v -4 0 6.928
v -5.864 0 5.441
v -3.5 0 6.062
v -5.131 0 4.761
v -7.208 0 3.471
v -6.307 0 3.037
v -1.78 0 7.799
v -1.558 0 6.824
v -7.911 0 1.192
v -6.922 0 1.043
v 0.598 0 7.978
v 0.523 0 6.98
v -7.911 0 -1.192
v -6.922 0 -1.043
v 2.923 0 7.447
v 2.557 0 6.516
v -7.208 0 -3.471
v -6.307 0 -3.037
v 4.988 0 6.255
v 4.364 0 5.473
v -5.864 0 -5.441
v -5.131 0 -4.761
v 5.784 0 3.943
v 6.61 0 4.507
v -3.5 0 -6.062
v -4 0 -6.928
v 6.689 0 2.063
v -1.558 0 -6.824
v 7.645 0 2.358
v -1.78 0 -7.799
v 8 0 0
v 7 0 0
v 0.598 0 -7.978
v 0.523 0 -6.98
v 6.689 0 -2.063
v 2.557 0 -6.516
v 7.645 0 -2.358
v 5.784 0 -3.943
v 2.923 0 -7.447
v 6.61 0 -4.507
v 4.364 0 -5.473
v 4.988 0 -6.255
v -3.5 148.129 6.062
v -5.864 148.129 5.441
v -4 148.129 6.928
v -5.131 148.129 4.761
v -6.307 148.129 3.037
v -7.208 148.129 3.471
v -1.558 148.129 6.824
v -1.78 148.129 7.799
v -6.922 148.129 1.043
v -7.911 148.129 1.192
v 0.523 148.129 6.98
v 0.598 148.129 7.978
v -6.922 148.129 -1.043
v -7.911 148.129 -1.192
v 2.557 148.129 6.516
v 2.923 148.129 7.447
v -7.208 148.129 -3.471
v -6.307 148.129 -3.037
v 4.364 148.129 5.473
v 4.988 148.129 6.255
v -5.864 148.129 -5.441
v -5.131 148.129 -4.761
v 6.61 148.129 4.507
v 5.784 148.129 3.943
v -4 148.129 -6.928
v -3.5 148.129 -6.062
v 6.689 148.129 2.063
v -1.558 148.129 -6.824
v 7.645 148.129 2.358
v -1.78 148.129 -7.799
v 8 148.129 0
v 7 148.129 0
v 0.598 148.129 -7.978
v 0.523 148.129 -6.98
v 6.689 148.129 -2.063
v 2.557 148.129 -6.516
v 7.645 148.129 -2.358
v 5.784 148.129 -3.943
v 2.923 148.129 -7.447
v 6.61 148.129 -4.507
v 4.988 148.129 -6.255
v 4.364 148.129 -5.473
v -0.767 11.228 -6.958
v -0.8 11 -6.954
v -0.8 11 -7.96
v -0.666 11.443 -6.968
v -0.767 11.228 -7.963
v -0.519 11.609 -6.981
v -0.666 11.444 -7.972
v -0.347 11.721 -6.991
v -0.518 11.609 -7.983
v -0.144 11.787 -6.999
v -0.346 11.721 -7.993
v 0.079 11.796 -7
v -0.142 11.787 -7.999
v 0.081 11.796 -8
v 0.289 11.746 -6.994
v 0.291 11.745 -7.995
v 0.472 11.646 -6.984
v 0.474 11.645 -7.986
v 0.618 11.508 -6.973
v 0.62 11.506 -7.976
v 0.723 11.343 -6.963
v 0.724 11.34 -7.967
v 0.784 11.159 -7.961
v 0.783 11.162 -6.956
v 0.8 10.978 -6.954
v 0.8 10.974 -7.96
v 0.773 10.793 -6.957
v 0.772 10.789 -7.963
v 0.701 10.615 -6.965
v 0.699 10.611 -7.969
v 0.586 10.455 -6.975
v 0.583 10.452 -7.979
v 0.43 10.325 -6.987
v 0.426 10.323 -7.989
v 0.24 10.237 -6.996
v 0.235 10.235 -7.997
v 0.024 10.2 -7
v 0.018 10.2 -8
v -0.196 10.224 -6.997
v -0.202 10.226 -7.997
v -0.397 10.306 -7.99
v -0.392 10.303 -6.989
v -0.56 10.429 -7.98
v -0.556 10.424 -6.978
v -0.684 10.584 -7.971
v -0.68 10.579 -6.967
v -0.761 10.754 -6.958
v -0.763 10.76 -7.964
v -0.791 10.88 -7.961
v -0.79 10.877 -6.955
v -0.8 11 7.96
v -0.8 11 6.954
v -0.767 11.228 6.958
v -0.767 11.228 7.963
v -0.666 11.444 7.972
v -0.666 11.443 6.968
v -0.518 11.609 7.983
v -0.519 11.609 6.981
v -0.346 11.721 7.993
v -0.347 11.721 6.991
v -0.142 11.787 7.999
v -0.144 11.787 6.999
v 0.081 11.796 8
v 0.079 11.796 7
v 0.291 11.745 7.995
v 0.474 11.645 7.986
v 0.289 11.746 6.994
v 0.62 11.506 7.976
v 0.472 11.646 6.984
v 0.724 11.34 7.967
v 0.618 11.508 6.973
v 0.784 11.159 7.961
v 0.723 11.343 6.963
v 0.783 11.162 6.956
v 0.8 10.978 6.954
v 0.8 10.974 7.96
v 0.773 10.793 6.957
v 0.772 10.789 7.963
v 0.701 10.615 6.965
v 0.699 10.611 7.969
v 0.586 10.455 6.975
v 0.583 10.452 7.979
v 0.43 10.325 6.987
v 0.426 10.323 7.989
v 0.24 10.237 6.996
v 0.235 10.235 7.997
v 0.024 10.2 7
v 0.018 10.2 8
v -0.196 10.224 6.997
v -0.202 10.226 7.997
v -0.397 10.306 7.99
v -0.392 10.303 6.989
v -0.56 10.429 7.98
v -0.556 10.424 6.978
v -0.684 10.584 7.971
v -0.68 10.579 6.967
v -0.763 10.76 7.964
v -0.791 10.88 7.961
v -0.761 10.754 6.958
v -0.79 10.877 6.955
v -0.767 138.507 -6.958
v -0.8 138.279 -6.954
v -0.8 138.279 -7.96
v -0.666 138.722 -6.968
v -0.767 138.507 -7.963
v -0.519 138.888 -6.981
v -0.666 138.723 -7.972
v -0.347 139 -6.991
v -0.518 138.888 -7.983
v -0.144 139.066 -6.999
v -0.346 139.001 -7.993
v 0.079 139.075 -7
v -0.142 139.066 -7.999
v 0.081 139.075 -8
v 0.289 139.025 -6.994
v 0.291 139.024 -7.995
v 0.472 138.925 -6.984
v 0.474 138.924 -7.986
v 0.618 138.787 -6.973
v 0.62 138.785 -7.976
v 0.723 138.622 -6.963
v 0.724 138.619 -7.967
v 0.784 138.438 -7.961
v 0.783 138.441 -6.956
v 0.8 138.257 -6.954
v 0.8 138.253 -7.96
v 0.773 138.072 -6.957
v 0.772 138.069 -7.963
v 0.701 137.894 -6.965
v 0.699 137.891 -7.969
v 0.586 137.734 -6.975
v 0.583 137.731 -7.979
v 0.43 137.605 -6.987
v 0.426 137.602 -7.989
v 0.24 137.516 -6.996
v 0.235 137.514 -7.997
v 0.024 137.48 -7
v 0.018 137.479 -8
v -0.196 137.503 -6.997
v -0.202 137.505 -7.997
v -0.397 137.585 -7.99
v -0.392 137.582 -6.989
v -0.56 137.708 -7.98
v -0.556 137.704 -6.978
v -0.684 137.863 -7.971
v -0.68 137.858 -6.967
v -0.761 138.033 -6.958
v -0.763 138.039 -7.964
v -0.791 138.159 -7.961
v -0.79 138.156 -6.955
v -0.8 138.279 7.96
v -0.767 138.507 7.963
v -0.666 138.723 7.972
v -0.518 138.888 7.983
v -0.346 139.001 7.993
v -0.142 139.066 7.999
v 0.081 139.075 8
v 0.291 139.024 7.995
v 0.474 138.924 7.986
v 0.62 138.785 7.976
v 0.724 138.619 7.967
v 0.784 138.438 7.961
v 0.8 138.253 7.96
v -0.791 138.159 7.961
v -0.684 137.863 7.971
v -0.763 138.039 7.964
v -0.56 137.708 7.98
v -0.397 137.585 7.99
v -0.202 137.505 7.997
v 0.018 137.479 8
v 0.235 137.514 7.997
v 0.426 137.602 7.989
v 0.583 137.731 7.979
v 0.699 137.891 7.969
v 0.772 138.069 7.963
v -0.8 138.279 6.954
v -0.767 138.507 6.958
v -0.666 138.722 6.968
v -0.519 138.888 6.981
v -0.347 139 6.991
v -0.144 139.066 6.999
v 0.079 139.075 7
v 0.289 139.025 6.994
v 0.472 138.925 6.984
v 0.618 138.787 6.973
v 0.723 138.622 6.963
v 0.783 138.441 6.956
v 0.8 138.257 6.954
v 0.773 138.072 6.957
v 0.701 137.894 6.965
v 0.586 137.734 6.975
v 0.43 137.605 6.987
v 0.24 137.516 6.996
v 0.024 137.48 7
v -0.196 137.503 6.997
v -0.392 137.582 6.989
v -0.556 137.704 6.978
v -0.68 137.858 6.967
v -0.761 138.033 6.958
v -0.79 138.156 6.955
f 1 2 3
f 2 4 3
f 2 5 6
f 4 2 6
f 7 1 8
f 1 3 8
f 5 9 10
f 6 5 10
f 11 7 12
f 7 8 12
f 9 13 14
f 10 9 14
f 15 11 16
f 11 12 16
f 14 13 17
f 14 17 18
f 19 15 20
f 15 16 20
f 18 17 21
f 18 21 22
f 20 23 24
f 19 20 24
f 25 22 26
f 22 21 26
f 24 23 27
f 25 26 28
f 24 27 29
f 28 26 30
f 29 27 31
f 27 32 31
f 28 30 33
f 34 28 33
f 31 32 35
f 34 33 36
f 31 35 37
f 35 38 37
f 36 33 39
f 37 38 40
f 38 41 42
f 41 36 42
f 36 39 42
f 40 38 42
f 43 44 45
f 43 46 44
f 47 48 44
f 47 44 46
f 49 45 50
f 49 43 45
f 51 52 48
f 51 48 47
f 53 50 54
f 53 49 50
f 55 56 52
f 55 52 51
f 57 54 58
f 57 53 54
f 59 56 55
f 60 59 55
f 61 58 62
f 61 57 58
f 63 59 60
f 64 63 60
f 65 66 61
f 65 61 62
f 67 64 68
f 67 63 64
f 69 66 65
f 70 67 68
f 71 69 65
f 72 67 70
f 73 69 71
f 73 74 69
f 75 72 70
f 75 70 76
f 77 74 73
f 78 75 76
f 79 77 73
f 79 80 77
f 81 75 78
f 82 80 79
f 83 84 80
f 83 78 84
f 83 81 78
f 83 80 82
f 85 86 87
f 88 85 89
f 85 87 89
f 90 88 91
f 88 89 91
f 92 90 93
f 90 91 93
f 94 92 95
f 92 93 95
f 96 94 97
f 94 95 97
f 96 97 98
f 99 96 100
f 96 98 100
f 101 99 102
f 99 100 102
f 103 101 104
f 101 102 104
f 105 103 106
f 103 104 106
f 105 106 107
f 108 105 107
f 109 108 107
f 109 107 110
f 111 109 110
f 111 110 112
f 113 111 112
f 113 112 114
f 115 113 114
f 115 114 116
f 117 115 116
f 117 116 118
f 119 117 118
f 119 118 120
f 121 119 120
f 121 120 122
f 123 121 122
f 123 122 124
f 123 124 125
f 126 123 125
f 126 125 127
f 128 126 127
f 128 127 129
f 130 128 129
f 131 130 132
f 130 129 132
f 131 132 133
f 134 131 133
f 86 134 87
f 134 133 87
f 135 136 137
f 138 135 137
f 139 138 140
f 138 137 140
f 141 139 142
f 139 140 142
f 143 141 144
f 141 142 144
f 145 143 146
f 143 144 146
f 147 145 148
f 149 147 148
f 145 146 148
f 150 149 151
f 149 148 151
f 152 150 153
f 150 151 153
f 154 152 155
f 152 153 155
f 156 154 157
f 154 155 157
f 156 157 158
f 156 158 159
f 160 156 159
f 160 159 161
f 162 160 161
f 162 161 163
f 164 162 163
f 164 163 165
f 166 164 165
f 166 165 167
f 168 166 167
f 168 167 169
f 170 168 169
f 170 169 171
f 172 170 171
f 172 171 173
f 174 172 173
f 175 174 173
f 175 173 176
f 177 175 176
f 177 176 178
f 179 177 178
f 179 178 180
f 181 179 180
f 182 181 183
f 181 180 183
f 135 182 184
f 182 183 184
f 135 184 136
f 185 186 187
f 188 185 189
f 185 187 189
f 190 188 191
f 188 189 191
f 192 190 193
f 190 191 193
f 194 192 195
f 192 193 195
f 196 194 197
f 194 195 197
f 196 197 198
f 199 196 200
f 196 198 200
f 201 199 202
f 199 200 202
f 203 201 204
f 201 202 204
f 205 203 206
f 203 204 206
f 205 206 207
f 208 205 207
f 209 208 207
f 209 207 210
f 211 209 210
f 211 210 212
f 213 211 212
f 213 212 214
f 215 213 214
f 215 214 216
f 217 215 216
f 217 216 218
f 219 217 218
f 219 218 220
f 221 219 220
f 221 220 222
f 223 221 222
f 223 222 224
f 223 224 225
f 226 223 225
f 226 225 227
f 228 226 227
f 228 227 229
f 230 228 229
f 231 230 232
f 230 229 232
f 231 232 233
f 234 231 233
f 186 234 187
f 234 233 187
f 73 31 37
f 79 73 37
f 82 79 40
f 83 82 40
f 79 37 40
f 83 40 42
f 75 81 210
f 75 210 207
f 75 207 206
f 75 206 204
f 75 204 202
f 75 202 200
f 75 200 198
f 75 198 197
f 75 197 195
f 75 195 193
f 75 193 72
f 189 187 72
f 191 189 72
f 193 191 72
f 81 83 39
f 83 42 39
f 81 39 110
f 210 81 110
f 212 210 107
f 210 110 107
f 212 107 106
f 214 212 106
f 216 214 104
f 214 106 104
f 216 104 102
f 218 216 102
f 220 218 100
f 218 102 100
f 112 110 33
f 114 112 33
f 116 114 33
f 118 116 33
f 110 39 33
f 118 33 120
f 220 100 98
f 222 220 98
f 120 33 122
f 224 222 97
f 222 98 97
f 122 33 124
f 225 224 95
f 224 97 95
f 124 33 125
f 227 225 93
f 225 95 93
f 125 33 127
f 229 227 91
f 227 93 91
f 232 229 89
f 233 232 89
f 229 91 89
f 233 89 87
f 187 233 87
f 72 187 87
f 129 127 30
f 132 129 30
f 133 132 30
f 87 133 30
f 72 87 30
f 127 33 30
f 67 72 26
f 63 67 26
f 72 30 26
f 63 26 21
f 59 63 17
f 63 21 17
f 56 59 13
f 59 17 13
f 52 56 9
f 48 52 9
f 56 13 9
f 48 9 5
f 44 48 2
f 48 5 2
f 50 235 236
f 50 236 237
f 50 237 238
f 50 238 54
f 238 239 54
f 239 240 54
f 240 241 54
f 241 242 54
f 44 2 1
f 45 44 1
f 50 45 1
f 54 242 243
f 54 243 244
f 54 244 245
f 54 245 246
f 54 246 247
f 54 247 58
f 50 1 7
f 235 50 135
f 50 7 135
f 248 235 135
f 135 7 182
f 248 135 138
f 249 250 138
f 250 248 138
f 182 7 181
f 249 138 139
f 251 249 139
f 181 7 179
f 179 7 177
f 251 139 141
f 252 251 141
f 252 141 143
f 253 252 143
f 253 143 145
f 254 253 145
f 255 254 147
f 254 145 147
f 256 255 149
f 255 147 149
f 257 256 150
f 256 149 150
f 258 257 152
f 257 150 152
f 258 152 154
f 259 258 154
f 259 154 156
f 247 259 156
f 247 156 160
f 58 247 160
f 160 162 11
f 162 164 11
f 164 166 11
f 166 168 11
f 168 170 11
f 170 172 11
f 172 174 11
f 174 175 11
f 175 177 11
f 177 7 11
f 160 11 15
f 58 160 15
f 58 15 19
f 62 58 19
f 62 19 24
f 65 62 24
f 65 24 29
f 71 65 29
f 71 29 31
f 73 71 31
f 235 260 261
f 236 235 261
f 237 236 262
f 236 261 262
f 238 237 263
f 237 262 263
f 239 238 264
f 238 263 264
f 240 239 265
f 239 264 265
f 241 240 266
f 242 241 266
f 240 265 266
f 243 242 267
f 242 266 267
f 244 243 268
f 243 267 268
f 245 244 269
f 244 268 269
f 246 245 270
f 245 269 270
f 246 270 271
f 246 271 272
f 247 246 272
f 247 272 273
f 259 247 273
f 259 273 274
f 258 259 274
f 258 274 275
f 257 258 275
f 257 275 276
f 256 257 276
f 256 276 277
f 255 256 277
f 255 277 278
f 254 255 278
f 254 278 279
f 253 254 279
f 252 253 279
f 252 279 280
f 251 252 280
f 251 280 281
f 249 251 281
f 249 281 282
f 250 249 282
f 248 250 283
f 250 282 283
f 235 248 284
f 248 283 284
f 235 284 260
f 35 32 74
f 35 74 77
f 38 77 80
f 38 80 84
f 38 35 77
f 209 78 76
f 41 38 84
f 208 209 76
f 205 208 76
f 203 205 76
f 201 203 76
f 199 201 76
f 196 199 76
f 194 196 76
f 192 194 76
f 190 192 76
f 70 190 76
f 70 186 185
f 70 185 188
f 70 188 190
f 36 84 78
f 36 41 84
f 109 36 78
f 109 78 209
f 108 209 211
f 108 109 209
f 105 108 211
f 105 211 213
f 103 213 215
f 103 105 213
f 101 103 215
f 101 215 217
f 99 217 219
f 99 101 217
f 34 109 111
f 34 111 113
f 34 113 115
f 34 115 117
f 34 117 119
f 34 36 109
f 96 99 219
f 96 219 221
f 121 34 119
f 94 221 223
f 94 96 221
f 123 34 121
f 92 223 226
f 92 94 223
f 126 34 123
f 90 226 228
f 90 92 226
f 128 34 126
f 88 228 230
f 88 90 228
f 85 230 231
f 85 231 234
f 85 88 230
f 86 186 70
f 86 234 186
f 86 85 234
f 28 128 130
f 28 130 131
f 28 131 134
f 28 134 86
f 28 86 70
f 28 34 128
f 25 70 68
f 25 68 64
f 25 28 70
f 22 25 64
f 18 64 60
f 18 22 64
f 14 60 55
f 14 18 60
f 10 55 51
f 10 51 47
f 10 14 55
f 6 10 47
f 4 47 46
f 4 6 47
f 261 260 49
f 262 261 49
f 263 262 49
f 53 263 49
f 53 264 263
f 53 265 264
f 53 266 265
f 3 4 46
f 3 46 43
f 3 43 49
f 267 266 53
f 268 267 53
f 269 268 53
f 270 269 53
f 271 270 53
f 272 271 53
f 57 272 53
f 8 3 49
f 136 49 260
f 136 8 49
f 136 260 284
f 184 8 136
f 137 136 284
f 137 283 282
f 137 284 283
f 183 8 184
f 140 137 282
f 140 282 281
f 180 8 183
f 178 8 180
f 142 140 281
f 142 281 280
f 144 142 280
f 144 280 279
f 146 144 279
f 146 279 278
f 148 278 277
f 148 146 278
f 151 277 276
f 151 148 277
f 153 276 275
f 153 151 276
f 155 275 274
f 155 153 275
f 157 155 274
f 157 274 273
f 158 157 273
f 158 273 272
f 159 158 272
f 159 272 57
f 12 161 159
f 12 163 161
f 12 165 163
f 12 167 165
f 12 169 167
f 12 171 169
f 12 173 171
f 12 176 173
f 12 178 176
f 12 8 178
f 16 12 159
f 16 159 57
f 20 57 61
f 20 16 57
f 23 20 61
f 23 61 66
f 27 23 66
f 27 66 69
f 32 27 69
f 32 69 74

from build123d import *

# Parameters (mm, degrees)
SKETCH2_R           = 8
SKETCH2_R_2         = 7
BOSS_EXTRUDE1_DEPTH = 148.12915224
M2_TAPPED_HOLE1_D   = 1.6


with BuildPart() as part:
    # Sketch2 → Boss-Extrude1 (new body)
    with BuildSketch(Plane(origin=(0, 0, 0), x_dir=(1, 0, 0), z_dir=(0, 1, 0))):
        Circle(SKETCH2_R)
        Circle(SKETCH2_R_2, mode=Mode.SUBTRACT)
    extrude(amount=BOSS_EXTRUDE1_DEPTH)

    # M2 Tapped Hole1 (through all)
    with Locations(Plane.XY.offset(8)):
        with Locations((0, 11), (0, 138.27915224)):
            Hole(M2_TAPPED_HOLE1_D / 2)


solid = part.part
